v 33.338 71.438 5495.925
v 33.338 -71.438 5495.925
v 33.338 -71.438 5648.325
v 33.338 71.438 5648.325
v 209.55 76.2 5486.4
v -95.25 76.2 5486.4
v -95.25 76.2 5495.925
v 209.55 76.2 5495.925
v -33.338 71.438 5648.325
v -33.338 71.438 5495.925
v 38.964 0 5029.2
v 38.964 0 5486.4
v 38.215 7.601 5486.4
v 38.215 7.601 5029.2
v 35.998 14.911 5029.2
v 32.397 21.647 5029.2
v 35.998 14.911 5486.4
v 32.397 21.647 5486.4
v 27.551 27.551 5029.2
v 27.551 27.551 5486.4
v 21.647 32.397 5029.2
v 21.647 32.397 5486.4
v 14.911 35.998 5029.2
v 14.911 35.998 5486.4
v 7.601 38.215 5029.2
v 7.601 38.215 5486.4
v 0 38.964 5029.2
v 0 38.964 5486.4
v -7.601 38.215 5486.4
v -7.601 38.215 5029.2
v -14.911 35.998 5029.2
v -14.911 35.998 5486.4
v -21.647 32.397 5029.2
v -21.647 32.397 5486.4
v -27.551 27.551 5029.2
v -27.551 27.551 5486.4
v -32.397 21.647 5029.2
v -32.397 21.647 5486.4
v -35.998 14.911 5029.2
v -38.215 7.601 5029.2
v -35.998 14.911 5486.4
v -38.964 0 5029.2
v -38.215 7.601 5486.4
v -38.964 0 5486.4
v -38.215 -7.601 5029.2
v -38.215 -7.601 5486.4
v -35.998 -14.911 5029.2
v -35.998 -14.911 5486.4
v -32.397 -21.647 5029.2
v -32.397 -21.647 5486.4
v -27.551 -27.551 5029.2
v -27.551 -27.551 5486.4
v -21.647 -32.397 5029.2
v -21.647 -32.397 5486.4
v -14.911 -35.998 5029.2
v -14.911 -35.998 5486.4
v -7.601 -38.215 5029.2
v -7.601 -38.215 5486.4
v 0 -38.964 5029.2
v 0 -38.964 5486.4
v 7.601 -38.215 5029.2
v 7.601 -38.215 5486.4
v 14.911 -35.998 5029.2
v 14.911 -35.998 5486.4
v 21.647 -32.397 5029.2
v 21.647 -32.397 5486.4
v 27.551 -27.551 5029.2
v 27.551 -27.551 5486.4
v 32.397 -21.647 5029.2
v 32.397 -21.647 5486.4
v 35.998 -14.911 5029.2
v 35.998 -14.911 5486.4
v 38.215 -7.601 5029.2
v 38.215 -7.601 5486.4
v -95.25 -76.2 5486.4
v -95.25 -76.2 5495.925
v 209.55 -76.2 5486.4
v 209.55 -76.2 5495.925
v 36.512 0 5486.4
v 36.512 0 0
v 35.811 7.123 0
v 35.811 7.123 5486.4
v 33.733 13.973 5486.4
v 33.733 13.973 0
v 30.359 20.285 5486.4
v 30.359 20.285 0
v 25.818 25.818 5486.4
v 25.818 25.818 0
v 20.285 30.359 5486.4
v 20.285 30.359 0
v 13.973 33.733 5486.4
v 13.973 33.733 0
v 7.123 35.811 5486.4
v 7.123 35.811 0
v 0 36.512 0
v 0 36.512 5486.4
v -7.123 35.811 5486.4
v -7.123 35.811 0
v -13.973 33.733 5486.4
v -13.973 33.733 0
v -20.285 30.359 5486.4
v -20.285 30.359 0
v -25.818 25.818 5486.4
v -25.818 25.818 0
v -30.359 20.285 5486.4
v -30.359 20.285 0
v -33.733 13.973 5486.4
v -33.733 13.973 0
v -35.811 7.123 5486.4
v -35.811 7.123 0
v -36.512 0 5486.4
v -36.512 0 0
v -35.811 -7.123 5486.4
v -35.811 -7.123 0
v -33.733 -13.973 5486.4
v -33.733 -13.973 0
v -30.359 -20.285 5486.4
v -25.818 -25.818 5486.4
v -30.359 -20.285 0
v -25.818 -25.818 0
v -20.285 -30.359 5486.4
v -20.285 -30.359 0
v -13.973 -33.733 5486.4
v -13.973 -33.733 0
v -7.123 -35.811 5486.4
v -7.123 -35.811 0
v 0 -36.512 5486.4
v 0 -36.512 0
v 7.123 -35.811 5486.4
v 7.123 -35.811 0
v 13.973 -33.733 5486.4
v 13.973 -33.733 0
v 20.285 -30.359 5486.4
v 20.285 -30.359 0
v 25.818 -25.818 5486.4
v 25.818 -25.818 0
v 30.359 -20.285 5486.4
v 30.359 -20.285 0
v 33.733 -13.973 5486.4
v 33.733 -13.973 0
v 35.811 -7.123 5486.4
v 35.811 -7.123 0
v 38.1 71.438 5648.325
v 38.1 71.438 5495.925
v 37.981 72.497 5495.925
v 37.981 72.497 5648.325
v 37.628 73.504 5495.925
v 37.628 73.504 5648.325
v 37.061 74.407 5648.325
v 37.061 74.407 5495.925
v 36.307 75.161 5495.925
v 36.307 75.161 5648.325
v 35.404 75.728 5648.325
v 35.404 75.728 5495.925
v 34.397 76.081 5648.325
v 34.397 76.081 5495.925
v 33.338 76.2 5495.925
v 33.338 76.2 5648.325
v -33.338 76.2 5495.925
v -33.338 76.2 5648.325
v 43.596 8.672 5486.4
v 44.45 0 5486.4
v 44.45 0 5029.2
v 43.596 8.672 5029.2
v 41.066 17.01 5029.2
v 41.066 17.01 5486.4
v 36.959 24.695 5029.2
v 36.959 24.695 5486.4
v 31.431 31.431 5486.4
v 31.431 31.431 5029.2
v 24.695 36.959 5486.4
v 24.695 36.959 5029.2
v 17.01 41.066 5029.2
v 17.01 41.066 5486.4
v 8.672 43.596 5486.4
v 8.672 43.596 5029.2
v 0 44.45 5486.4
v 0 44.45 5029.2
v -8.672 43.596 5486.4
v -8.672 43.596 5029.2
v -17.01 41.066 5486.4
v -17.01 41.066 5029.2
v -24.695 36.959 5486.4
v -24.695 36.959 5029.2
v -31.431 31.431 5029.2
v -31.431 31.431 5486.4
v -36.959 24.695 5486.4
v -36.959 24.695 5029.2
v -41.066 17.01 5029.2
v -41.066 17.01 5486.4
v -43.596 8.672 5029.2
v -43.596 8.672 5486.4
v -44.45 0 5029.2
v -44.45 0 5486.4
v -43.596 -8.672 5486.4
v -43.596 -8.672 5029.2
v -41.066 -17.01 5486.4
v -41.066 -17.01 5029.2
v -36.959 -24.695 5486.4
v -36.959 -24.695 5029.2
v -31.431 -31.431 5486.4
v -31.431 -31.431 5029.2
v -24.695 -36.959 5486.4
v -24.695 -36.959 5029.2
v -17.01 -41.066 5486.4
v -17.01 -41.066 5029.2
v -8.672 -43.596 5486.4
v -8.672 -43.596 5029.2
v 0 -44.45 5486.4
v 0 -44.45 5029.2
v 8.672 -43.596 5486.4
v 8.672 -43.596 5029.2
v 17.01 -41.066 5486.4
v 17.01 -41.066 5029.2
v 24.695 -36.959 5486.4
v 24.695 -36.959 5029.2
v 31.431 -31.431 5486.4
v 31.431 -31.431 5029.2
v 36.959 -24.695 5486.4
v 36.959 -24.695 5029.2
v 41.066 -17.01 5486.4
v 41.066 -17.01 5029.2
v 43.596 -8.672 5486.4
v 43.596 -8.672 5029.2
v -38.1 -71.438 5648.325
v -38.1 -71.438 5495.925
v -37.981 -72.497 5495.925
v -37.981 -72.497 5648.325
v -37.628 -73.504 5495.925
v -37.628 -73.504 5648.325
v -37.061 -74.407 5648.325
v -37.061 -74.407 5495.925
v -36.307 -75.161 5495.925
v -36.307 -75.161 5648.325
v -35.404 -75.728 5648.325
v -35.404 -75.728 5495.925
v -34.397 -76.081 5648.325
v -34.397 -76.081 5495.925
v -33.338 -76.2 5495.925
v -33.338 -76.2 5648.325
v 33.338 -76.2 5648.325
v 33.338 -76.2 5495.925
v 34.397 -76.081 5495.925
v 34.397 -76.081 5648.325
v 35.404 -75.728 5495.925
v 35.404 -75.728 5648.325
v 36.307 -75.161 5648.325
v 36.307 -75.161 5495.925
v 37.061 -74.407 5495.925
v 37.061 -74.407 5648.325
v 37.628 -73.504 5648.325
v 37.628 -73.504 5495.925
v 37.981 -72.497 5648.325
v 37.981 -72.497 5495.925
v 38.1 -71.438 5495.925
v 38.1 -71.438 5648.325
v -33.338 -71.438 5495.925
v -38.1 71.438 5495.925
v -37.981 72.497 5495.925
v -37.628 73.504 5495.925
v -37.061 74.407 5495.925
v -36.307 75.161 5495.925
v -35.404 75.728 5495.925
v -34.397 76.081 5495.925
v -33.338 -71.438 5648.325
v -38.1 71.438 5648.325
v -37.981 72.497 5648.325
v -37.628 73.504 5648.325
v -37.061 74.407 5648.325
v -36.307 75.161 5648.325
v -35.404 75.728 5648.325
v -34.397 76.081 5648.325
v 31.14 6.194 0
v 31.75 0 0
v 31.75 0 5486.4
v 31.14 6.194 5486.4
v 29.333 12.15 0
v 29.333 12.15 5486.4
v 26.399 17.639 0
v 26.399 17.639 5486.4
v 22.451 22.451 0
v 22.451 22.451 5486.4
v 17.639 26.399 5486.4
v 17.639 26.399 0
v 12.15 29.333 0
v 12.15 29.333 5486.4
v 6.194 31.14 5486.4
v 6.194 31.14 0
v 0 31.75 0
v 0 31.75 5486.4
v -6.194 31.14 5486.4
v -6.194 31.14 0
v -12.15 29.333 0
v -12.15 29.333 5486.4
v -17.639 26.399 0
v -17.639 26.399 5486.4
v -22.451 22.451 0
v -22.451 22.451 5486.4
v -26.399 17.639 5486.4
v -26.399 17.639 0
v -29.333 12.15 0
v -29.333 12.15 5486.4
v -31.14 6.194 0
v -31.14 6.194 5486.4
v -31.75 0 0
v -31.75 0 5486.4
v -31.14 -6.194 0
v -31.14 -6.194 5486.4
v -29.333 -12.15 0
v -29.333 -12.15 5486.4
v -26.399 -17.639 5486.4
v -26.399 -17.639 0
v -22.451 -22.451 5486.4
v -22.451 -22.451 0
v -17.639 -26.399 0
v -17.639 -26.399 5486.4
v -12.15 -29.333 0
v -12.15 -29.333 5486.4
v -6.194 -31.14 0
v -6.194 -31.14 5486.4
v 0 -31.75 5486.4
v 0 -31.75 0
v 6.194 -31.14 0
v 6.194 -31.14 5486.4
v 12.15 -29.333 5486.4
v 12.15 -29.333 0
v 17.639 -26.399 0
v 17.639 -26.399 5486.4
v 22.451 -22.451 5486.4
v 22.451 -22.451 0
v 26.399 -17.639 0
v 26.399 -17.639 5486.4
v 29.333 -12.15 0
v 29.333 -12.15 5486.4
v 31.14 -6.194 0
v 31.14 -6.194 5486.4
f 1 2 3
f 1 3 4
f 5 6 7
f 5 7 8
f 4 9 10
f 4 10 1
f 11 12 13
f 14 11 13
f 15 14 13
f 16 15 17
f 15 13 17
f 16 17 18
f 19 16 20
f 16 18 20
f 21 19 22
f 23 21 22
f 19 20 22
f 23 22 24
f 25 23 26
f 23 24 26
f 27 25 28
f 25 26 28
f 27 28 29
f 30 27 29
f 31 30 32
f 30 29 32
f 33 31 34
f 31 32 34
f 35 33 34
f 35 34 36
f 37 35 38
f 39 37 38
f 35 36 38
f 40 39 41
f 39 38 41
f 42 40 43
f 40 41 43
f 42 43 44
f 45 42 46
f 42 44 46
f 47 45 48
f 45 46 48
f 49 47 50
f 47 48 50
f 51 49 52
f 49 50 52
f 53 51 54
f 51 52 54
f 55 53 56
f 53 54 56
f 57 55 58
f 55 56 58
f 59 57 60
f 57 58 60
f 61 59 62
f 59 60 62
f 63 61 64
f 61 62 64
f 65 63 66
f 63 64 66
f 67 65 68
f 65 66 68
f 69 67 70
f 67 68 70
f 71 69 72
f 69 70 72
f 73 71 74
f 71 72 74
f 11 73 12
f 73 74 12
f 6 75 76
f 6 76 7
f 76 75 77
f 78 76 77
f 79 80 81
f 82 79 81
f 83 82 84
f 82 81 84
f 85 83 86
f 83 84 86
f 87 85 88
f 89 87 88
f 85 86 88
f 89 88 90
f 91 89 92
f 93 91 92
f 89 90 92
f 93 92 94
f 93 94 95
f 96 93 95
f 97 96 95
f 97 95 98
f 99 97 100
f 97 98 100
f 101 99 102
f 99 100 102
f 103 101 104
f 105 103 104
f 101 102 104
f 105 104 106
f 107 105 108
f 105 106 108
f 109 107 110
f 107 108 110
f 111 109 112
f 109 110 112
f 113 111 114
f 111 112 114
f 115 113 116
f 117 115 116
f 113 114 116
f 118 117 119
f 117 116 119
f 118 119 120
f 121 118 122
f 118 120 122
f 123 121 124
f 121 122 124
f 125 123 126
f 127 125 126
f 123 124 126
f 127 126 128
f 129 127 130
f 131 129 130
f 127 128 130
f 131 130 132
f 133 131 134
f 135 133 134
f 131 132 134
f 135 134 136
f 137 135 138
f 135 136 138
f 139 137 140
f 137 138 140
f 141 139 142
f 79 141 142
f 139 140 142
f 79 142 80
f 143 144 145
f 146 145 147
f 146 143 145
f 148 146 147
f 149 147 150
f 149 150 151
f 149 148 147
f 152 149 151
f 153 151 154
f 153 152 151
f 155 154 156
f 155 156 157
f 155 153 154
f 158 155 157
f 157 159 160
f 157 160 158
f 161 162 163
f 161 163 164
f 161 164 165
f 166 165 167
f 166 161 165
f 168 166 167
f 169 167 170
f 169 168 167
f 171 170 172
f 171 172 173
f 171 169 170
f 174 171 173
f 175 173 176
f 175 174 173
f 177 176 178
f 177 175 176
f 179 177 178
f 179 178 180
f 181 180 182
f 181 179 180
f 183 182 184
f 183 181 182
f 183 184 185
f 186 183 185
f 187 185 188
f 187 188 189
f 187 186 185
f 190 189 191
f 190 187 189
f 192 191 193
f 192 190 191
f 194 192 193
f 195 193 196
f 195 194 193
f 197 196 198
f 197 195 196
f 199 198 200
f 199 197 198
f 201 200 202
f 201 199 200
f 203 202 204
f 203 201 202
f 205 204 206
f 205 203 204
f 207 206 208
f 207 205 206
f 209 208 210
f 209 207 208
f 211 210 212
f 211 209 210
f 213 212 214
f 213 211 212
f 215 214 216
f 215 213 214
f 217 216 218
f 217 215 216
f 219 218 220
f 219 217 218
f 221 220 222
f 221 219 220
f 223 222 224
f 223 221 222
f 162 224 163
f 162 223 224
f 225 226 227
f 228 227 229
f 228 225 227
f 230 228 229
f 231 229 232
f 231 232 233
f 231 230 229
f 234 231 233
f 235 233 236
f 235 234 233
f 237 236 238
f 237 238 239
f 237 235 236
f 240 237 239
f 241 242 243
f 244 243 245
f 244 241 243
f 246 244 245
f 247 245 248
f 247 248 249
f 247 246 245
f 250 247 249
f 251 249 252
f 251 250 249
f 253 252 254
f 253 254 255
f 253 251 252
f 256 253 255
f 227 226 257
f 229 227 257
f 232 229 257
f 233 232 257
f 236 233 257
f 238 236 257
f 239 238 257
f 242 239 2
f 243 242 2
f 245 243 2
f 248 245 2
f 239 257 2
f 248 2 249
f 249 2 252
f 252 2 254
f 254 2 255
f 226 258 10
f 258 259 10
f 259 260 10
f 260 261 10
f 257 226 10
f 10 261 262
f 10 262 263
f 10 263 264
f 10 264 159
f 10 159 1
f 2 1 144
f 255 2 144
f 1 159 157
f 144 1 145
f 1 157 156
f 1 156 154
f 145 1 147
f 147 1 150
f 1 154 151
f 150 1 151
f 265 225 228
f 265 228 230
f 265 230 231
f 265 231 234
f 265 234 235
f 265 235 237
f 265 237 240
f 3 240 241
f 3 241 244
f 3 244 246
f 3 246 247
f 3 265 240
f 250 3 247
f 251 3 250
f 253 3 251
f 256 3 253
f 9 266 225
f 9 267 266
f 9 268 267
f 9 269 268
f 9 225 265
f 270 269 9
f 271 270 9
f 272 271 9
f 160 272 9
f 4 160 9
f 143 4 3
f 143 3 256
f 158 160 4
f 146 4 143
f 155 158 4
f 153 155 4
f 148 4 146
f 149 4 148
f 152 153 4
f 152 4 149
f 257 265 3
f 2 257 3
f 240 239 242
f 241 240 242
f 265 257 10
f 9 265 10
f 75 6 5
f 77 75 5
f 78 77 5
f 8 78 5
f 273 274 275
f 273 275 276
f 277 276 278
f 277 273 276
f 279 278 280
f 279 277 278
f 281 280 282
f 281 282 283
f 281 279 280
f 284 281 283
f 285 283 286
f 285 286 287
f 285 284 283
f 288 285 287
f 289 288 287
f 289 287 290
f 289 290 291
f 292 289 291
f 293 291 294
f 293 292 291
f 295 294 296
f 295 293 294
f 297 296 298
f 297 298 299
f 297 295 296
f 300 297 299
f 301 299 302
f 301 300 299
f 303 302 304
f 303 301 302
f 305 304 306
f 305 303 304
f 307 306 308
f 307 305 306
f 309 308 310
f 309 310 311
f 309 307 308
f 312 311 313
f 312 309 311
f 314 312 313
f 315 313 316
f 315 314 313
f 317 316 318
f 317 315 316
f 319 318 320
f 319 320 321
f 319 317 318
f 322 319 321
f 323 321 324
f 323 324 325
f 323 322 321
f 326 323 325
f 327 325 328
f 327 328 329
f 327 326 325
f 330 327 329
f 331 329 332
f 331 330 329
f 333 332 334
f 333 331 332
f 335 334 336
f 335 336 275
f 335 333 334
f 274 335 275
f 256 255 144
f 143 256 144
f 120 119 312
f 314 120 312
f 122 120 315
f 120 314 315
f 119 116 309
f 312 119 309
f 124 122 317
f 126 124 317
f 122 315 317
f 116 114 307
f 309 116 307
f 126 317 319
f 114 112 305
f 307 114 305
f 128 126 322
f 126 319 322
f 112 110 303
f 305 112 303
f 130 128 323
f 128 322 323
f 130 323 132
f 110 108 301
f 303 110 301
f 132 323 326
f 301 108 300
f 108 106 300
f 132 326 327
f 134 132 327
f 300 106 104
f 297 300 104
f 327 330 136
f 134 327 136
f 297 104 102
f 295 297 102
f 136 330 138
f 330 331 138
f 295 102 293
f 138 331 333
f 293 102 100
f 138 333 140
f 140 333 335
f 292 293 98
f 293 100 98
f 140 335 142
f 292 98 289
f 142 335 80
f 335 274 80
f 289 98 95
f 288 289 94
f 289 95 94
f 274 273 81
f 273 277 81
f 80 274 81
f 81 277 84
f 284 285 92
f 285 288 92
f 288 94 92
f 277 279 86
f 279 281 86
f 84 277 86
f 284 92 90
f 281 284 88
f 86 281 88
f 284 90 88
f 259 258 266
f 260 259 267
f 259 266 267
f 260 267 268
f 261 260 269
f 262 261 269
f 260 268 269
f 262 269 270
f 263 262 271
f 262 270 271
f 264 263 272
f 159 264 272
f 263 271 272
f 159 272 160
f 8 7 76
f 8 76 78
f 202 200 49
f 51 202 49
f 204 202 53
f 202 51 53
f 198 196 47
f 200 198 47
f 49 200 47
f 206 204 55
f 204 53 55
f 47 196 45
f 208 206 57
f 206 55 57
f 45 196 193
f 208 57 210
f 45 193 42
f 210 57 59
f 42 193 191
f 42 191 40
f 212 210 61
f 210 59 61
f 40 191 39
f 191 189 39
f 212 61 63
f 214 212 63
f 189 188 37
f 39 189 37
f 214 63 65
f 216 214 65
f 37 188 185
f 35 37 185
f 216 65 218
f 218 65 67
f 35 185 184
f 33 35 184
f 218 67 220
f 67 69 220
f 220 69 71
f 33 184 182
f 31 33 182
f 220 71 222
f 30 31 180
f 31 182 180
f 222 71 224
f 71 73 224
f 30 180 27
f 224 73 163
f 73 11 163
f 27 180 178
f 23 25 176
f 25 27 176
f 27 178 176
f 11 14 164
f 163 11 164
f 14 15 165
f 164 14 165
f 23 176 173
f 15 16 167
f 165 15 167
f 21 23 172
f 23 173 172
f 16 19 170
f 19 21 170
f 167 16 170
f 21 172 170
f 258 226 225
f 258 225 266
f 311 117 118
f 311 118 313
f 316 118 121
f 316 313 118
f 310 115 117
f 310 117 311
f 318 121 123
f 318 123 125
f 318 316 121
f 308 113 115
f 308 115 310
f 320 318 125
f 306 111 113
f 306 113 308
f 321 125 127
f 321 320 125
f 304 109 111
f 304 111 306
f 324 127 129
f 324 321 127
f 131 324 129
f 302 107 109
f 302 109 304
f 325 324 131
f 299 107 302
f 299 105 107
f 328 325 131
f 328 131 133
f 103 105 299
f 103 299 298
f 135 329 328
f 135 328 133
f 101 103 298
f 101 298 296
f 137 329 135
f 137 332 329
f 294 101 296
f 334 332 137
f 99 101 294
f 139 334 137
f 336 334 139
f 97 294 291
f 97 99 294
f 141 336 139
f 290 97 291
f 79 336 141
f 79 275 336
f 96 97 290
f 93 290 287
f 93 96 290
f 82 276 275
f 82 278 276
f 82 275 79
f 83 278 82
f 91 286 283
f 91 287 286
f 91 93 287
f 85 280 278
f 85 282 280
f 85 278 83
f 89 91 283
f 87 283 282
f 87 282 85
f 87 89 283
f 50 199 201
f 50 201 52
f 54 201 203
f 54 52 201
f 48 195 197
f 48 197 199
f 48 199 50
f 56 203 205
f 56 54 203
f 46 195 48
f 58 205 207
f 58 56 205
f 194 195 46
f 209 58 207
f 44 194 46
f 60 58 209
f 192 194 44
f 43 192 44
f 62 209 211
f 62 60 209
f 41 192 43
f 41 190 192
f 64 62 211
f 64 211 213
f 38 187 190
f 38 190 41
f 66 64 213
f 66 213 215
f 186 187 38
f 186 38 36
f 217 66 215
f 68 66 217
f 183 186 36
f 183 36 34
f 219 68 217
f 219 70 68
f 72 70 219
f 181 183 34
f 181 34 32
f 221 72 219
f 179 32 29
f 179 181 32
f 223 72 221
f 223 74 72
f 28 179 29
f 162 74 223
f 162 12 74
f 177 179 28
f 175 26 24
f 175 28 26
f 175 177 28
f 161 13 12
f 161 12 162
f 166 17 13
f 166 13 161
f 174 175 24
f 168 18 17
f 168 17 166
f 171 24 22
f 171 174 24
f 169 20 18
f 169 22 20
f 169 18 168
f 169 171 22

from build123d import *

# Parameters (mm, degrees)
F0_R      = 36.5125
F0_R_2    = 31.75
F1_DEPTH  = 5486.4
F2_R      = 44.45
F2_R_2    = 38.9636
F3_DEPTH  = 457.2
F4_W      = 304.8
F4_H      = 152.4
F5_DEPTH  = 9.525
F6_W      = 76.2
F6_H      = 152.4
F7_DEPTH  = 152.4
F8_R      = 4.7625
F9_W      = 66.675
F9_H      = 142.875
F10_DEPTH = 5648.326


with BuildPart() as f1:
    # F0 (on Top) → F1 (new body)
    with BuildSketch(Plane.XY):
        Circle(F0_R)
        Circle(F0_R_2, mode=Mode.SUBTRACT)
    extrude(amount=F1_DEPTH)


with BuildPart() as f3:
    # F2 (on face) → F3 (new body)
    with BuildSketch(Plane.XY.offset(5486.4)):
        Circle(F2_R)
        Circle(F2_R_2, mode=Mode.SUBTRACT)
    extrude(amount=-F3_DEPTH)


with BuildPart() as f5:
    # F4 (on face) → F5 (new body)
    with BuildSketch(Plane.XY.offset(5486.4)):
        with Locations((57.15, 0)):
            Rectangle(F4_W, F4_H)
    extrude(amount=F5_DEPTH)


with BuildPart() as f7:
    # F6 (on face) → F7 (new body)
    with BuildSketch(Plane.XY.offset(5495.925)):
        Rectangle(F6_W, F6_H)
    extrude(amount=F7_DEPTH)

    # F8
    f8_edges = [f7.edges().sort_by_distance(p)[0] for p in [
        (-38.1, -76.2, 5572.125),
        (38.1, -76.2, 5572.125),
        (-38.1, 76.2, 5572.125),
        (38.1, 76.2, 5572.125),
    ]]
    fillet(f8_edges, radius=F8_R)

    # F9 (on face) → F10 (cut, through all)
    with BuildSketch(Plane.XY.offset(5648.325)):
        Rectangle(F9_W, F9_H)
    extrude(amount=-F10_DEPTH, mode=Mode.SUBTRACT)


solid = Compound([f1.part, f3.part, f5.part, f7.part])
